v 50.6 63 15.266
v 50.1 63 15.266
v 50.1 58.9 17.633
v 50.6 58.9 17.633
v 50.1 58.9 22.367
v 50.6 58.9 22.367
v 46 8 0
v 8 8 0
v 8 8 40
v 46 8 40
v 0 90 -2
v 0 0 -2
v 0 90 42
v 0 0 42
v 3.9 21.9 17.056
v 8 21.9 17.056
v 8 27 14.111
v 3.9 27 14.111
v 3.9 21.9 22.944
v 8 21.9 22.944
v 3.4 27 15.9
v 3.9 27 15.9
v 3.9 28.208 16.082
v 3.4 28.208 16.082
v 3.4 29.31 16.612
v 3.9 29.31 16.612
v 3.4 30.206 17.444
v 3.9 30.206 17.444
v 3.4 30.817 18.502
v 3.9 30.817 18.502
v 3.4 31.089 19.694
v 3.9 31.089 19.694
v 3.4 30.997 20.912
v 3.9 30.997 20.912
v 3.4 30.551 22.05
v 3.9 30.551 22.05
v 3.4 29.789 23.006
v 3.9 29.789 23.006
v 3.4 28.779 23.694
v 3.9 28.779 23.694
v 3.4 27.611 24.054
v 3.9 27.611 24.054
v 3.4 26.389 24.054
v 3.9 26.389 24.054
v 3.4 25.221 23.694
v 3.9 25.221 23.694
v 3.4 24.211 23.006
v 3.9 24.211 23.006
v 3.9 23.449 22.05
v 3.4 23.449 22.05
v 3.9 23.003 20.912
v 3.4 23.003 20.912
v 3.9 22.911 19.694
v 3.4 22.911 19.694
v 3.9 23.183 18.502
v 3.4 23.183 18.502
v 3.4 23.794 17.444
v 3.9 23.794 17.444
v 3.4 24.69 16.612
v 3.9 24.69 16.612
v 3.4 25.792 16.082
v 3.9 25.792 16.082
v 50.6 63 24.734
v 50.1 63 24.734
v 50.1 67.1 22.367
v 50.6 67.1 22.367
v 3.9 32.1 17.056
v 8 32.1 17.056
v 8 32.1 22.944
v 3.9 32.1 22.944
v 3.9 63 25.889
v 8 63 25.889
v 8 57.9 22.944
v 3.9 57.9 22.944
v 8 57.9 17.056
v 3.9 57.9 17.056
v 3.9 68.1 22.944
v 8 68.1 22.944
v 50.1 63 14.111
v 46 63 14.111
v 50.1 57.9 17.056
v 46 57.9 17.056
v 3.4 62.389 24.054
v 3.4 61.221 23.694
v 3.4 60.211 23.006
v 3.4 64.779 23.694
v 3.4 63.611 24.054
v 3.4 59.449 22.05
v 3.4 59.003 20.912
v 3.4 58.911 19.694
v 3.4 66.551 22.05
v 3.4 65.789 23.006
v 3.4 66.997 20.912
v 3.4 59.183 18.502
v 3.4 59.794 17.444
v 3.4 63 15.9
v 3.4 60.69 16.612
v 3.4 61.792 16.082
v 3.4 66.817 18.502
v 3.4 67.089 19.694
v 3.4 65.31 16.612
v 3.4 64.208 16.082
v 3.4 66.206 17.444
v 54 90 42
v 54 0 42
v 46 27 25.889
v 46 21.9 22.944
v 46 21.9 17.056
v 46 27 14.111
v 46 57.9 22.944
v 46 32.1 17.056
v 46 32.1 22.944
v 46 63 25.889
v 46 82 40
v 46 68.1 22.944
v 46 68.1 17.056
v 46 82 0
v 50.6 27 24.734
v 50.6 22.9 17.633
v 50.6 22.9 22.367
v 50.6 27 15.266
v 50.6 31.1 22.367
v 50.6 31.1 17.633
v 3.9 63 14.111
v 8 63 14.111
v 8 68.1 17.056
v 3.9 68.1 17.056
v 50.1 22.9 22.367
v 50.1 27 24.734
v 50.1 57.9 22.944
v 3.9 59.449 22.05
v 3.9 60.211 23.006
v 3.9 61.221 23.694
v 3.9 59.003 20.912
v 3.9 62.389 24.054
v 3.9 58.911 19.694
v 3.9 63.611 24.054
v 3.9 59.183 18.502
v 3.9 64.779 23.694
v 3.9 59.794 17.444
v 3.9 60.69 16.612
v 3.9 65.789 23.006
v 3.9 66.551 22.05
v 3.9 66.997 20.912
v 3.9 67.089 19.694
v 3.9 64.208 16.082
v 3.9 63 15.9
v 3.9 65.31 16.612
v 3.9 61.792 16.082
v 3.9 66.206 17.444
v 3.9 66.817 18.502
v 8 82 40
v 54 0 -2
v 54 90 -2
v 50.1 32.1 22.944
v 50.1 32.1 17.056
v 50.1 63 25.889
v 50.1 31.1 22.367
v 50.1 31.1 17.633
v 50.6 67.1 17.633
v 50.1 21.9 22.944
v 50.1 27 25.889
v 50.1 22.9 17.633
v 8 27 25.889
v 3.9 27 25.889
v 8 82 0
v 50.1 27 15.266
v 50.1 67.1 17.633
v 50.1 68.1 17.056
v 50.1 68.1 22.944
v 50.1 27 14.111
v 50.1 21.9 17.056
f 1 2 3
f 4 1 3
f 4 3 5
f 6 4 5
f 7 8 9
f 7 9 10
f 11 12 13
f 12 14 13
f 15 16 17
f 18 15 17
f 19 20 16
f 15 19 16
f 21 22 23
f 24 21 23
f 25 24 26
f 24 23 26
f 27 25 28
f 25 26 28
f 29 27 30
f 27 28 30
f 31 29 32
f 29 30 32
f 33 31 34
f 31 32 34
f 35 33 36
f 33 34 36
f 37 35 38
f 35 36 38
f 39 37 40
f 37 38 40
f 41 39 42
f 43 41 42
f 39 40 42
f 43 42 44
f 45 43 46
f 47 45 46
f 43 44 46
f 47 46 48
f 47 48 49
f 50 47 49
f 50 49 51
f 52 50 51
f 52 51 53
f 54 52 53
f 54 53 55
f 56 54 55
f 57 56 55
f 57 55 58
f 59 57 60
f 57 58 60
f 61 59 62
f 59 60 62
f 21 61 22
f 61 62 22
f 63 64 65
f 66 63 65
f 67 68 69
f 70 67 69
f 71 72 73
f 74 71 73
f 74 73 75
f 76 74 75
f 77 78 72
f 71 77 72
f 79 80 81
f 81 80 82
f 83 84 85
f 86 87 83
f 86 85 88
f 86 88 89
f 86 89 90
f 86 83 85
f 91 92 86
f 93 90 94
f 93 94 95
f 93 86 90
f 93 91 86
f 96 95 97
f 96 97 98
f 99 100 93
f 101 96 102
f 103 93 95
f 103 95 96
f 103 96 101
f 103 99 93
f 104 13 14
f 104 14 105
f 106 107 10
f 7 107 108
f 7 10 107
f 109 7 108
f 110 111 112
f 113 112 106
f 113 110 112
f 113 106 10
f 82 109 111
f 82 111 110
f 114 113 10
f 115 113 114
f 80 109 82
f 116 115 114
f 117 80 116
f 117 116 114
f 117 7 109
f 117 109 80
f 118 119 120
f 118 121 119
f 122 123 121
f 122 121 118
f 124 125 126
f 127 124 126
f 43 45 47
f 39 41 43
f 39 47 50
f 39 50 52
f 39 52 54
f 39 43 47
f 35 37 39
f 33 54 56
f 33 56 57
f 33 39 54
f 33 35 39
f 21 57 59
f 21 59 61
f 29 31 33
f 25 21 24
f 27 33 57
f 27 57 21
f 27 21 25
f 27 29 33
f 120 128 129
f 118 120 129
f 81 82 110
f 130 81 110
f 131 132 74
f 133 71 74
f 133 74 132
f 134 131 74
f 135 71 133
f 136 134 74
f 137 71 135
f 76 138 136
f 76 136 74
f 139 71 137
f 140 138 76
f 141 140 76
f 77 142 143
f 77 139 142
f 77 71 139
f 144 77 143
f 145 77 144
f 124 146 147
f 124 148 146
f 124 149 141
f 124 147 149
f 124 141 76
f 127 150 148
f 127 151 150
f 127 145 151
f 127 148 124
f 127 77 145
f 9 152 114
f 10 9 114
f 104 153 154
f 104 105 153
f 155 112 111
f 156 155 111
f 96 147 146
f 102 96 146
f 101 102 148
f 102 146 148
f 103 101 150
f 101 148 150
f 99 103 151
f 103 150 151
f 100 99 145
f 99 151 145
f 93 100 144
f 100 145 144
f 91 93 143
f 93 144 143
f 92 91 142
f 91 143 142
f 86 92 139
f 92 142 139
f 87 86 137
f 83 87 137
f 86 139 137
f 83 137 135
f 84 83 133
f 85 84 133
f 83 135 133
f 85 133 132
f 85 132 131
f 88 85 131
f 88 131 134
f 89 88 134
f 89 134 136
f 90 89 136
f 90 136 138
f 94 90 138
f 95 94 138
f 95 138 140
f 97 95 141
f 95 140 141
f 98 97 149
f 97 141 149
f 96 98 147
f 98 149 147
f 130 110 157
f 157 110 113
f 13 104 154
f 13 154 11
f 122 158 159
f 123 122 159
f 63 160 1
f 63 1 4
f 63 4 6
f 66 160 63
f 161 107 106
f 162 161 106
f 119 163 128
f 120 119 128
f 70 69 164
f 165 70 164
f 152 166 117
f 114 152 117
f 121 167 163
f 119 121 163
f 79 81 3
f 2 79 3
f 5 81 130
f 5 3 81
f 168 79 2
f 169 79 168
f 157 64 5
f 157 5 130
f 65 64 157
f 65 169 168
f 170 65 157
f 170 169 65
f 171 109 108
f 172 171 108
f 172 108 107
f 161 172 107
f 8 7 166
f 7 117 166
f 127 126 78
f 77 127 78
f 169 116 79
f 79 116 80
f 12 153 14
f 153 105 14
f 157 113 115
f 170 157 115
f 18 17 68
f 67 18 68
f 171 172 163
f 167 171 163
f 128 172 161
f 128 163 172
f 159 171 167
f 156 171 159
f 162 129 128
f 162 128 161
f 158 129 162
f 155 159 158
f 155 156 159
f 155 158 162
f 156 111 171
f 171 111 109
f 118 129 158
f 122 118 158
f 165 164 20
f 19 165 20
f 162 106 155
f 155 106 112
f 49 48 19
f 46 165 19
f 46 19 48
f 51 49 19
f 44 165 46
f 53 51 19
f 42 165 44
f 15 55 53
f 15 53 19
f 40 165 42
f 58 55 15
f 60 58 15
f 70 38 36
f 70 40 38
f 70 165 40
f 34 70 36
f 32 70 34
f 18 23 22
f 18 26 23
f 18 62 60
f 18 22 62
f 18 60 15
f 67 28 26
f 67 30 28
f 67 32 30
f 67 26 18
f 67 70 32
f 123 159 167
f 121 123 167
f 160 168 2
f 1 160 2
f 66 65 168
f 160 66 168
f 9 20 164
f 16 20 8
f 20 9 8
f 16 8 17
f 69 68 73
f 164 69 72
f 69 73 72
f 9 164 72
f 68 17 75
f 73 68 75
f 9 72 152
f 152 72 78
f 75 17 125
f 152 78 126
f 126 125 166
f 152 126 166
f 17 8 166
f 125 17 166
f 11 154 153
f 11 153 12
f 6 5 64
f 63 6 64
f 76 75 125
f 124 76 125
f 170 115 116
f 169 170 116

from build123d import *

# Parameters (mm, degrees)
SKETCH1_W           = 54
SKETCH1_H           = 90
SKETCH1_W_2         = 38
SKETCH1_H_2         = 74
BOSS_EXTRUDE1_DEPTH = 40
CUT_EXTRUDE1_DEPTH  = 4.1
CUT_EXTRUDE2_DEPTH  = 0.5
CUT_EXTRUDE3_DEPTH  = 4.1
SKETCH7_R           = 4.1
CUT_EXTRUDE4_DEPTH  = 0.5
SKETCH8_W           = 54
SKETCH8_H           = 90
BOSS_EXTRUDE2_DEPTH = 2
SKETCH9_W           = 54
SKETCH9_H           = 90
BOSS_EXTRUDE3_DEPTH = 2


with BuildPart() as part:
    # Sketch1 → Boss-Extrude1 (new body)
    with BuildSketch(Plane.XY):
        with Locations((27, 45)):
            Rectangle(SKETCH1_W, SKETCH1_H)
        with Locations((27, 45)):
            Rectangle(SKETCH1_W_2, SKETCH1_H_2, mode=Mode.SUBTRACT)
    extrude(amount=BOSS_EXTRUDE1_DEPTH)

    # Sketch2 → Cut-Extrude1 (cut)
    with BuildSketch(Plane.ZY.offset(-46)):
        Polygon((25.888972746, 63), (22.944486373, 68.1), (17.055513627, 68.1), (14.111027254, 63), (17.055513627, 57.9), (22.944486373, 57.9), align=None)
        Polygon((25.888972746, 27), (22.944486373, 32.1), (17.055513627, 32.1), (14.111027254, 27), (17.055513627, 21.9), (22.944486373, 21.9), align=None)
    extrude(amount=-CUT_EXTRUDE1_DEPTH, mode=Mode.SUBTRACT)

    # Sketch5 → Cut-Extrude2 (cut)
    with BuildSketch(Plane.ZY.offset(-50.1)):
        Polygon((17.632863896, 22.9), (22.367136104, 22.9), (24.734272207, 27), (22.367136104, 31.1), (17.632863896, 31.1), (15.265727793, 27), align=None)
        Polygon((24.734272207, 63), (22.367136104, 67.1), (17.632863896, 67.1), (15.265727793, 63), (17.632863896, 58.9), (22.367136104, 58.9), align=None)
    extrude(amount=-CUT_EXTRUDE2_DEPTH, mode=Mode.SUBTRACT)

    # Sketch6 → Cut-Extrude3 (cut)
    with BuildSketch(Plane(origin=(8, 0, 0), x_dir=(0, 0, -1), z_dir=(1, 0, 0))):
        Polygon((-14.111027254, 63), (-17.055513627, 68.1), (-22.944486373, 68.1), (-25.888972746, 63), (-22.944486373, 57.9), (-17.055513627, 57.9), align=None)
        Polygon((-14.111027254, 27), (-17.055513627, 32.1), (-22.944486373, 32.1), (-25.888972746, 27), (-22.944486373, 21.9), (-17.055513627, 21.9), align=None)
    extrude(amount=-CUT_EXTRUDE3_DEPTH, mode=Mode.SUBTRACT)

    # Sketch7 → Cut-Extrude4 (cut)
    with BuildSketch(Plane(origin=(3.9, 0, 0), x_dir=(0, 0, -1), z_dir=(1, 0, 0))):
        with Locations((-20, 63)):
            Circle(SKETCH7_R)
        with Locations((-20, 27)):
            Circle(SKETCH7_R)
    extrude(amount=-CUT_EXTRUDE4_DEPTH, mode=Mode.SUBTRACT)

    # Sketch8 → Boss-Extrude2 (add)
    with BuildSketch(Plane.XY.offset(40)):
        with Locations((27, 45)):
            Rectangle(SKETCH8_W, SKETCH8_H)
    extrude(amount=BOSS_EXTRUDE2_DEPTH)

    # Sketch9 → Boss-Extrude3 (add)
    with BuildSketch(Plane(origin=(0, 0, 0), x_dir=(-1, 0, 0), z_dir=(0, 0, -1))):
        with Locations((-27, 45)):
            Rectangle(SKETCH9_W, SKETCH9_H)
    extrude(amount=BOSS_EXTRUDE3_DEPTH)


solid = part.part
